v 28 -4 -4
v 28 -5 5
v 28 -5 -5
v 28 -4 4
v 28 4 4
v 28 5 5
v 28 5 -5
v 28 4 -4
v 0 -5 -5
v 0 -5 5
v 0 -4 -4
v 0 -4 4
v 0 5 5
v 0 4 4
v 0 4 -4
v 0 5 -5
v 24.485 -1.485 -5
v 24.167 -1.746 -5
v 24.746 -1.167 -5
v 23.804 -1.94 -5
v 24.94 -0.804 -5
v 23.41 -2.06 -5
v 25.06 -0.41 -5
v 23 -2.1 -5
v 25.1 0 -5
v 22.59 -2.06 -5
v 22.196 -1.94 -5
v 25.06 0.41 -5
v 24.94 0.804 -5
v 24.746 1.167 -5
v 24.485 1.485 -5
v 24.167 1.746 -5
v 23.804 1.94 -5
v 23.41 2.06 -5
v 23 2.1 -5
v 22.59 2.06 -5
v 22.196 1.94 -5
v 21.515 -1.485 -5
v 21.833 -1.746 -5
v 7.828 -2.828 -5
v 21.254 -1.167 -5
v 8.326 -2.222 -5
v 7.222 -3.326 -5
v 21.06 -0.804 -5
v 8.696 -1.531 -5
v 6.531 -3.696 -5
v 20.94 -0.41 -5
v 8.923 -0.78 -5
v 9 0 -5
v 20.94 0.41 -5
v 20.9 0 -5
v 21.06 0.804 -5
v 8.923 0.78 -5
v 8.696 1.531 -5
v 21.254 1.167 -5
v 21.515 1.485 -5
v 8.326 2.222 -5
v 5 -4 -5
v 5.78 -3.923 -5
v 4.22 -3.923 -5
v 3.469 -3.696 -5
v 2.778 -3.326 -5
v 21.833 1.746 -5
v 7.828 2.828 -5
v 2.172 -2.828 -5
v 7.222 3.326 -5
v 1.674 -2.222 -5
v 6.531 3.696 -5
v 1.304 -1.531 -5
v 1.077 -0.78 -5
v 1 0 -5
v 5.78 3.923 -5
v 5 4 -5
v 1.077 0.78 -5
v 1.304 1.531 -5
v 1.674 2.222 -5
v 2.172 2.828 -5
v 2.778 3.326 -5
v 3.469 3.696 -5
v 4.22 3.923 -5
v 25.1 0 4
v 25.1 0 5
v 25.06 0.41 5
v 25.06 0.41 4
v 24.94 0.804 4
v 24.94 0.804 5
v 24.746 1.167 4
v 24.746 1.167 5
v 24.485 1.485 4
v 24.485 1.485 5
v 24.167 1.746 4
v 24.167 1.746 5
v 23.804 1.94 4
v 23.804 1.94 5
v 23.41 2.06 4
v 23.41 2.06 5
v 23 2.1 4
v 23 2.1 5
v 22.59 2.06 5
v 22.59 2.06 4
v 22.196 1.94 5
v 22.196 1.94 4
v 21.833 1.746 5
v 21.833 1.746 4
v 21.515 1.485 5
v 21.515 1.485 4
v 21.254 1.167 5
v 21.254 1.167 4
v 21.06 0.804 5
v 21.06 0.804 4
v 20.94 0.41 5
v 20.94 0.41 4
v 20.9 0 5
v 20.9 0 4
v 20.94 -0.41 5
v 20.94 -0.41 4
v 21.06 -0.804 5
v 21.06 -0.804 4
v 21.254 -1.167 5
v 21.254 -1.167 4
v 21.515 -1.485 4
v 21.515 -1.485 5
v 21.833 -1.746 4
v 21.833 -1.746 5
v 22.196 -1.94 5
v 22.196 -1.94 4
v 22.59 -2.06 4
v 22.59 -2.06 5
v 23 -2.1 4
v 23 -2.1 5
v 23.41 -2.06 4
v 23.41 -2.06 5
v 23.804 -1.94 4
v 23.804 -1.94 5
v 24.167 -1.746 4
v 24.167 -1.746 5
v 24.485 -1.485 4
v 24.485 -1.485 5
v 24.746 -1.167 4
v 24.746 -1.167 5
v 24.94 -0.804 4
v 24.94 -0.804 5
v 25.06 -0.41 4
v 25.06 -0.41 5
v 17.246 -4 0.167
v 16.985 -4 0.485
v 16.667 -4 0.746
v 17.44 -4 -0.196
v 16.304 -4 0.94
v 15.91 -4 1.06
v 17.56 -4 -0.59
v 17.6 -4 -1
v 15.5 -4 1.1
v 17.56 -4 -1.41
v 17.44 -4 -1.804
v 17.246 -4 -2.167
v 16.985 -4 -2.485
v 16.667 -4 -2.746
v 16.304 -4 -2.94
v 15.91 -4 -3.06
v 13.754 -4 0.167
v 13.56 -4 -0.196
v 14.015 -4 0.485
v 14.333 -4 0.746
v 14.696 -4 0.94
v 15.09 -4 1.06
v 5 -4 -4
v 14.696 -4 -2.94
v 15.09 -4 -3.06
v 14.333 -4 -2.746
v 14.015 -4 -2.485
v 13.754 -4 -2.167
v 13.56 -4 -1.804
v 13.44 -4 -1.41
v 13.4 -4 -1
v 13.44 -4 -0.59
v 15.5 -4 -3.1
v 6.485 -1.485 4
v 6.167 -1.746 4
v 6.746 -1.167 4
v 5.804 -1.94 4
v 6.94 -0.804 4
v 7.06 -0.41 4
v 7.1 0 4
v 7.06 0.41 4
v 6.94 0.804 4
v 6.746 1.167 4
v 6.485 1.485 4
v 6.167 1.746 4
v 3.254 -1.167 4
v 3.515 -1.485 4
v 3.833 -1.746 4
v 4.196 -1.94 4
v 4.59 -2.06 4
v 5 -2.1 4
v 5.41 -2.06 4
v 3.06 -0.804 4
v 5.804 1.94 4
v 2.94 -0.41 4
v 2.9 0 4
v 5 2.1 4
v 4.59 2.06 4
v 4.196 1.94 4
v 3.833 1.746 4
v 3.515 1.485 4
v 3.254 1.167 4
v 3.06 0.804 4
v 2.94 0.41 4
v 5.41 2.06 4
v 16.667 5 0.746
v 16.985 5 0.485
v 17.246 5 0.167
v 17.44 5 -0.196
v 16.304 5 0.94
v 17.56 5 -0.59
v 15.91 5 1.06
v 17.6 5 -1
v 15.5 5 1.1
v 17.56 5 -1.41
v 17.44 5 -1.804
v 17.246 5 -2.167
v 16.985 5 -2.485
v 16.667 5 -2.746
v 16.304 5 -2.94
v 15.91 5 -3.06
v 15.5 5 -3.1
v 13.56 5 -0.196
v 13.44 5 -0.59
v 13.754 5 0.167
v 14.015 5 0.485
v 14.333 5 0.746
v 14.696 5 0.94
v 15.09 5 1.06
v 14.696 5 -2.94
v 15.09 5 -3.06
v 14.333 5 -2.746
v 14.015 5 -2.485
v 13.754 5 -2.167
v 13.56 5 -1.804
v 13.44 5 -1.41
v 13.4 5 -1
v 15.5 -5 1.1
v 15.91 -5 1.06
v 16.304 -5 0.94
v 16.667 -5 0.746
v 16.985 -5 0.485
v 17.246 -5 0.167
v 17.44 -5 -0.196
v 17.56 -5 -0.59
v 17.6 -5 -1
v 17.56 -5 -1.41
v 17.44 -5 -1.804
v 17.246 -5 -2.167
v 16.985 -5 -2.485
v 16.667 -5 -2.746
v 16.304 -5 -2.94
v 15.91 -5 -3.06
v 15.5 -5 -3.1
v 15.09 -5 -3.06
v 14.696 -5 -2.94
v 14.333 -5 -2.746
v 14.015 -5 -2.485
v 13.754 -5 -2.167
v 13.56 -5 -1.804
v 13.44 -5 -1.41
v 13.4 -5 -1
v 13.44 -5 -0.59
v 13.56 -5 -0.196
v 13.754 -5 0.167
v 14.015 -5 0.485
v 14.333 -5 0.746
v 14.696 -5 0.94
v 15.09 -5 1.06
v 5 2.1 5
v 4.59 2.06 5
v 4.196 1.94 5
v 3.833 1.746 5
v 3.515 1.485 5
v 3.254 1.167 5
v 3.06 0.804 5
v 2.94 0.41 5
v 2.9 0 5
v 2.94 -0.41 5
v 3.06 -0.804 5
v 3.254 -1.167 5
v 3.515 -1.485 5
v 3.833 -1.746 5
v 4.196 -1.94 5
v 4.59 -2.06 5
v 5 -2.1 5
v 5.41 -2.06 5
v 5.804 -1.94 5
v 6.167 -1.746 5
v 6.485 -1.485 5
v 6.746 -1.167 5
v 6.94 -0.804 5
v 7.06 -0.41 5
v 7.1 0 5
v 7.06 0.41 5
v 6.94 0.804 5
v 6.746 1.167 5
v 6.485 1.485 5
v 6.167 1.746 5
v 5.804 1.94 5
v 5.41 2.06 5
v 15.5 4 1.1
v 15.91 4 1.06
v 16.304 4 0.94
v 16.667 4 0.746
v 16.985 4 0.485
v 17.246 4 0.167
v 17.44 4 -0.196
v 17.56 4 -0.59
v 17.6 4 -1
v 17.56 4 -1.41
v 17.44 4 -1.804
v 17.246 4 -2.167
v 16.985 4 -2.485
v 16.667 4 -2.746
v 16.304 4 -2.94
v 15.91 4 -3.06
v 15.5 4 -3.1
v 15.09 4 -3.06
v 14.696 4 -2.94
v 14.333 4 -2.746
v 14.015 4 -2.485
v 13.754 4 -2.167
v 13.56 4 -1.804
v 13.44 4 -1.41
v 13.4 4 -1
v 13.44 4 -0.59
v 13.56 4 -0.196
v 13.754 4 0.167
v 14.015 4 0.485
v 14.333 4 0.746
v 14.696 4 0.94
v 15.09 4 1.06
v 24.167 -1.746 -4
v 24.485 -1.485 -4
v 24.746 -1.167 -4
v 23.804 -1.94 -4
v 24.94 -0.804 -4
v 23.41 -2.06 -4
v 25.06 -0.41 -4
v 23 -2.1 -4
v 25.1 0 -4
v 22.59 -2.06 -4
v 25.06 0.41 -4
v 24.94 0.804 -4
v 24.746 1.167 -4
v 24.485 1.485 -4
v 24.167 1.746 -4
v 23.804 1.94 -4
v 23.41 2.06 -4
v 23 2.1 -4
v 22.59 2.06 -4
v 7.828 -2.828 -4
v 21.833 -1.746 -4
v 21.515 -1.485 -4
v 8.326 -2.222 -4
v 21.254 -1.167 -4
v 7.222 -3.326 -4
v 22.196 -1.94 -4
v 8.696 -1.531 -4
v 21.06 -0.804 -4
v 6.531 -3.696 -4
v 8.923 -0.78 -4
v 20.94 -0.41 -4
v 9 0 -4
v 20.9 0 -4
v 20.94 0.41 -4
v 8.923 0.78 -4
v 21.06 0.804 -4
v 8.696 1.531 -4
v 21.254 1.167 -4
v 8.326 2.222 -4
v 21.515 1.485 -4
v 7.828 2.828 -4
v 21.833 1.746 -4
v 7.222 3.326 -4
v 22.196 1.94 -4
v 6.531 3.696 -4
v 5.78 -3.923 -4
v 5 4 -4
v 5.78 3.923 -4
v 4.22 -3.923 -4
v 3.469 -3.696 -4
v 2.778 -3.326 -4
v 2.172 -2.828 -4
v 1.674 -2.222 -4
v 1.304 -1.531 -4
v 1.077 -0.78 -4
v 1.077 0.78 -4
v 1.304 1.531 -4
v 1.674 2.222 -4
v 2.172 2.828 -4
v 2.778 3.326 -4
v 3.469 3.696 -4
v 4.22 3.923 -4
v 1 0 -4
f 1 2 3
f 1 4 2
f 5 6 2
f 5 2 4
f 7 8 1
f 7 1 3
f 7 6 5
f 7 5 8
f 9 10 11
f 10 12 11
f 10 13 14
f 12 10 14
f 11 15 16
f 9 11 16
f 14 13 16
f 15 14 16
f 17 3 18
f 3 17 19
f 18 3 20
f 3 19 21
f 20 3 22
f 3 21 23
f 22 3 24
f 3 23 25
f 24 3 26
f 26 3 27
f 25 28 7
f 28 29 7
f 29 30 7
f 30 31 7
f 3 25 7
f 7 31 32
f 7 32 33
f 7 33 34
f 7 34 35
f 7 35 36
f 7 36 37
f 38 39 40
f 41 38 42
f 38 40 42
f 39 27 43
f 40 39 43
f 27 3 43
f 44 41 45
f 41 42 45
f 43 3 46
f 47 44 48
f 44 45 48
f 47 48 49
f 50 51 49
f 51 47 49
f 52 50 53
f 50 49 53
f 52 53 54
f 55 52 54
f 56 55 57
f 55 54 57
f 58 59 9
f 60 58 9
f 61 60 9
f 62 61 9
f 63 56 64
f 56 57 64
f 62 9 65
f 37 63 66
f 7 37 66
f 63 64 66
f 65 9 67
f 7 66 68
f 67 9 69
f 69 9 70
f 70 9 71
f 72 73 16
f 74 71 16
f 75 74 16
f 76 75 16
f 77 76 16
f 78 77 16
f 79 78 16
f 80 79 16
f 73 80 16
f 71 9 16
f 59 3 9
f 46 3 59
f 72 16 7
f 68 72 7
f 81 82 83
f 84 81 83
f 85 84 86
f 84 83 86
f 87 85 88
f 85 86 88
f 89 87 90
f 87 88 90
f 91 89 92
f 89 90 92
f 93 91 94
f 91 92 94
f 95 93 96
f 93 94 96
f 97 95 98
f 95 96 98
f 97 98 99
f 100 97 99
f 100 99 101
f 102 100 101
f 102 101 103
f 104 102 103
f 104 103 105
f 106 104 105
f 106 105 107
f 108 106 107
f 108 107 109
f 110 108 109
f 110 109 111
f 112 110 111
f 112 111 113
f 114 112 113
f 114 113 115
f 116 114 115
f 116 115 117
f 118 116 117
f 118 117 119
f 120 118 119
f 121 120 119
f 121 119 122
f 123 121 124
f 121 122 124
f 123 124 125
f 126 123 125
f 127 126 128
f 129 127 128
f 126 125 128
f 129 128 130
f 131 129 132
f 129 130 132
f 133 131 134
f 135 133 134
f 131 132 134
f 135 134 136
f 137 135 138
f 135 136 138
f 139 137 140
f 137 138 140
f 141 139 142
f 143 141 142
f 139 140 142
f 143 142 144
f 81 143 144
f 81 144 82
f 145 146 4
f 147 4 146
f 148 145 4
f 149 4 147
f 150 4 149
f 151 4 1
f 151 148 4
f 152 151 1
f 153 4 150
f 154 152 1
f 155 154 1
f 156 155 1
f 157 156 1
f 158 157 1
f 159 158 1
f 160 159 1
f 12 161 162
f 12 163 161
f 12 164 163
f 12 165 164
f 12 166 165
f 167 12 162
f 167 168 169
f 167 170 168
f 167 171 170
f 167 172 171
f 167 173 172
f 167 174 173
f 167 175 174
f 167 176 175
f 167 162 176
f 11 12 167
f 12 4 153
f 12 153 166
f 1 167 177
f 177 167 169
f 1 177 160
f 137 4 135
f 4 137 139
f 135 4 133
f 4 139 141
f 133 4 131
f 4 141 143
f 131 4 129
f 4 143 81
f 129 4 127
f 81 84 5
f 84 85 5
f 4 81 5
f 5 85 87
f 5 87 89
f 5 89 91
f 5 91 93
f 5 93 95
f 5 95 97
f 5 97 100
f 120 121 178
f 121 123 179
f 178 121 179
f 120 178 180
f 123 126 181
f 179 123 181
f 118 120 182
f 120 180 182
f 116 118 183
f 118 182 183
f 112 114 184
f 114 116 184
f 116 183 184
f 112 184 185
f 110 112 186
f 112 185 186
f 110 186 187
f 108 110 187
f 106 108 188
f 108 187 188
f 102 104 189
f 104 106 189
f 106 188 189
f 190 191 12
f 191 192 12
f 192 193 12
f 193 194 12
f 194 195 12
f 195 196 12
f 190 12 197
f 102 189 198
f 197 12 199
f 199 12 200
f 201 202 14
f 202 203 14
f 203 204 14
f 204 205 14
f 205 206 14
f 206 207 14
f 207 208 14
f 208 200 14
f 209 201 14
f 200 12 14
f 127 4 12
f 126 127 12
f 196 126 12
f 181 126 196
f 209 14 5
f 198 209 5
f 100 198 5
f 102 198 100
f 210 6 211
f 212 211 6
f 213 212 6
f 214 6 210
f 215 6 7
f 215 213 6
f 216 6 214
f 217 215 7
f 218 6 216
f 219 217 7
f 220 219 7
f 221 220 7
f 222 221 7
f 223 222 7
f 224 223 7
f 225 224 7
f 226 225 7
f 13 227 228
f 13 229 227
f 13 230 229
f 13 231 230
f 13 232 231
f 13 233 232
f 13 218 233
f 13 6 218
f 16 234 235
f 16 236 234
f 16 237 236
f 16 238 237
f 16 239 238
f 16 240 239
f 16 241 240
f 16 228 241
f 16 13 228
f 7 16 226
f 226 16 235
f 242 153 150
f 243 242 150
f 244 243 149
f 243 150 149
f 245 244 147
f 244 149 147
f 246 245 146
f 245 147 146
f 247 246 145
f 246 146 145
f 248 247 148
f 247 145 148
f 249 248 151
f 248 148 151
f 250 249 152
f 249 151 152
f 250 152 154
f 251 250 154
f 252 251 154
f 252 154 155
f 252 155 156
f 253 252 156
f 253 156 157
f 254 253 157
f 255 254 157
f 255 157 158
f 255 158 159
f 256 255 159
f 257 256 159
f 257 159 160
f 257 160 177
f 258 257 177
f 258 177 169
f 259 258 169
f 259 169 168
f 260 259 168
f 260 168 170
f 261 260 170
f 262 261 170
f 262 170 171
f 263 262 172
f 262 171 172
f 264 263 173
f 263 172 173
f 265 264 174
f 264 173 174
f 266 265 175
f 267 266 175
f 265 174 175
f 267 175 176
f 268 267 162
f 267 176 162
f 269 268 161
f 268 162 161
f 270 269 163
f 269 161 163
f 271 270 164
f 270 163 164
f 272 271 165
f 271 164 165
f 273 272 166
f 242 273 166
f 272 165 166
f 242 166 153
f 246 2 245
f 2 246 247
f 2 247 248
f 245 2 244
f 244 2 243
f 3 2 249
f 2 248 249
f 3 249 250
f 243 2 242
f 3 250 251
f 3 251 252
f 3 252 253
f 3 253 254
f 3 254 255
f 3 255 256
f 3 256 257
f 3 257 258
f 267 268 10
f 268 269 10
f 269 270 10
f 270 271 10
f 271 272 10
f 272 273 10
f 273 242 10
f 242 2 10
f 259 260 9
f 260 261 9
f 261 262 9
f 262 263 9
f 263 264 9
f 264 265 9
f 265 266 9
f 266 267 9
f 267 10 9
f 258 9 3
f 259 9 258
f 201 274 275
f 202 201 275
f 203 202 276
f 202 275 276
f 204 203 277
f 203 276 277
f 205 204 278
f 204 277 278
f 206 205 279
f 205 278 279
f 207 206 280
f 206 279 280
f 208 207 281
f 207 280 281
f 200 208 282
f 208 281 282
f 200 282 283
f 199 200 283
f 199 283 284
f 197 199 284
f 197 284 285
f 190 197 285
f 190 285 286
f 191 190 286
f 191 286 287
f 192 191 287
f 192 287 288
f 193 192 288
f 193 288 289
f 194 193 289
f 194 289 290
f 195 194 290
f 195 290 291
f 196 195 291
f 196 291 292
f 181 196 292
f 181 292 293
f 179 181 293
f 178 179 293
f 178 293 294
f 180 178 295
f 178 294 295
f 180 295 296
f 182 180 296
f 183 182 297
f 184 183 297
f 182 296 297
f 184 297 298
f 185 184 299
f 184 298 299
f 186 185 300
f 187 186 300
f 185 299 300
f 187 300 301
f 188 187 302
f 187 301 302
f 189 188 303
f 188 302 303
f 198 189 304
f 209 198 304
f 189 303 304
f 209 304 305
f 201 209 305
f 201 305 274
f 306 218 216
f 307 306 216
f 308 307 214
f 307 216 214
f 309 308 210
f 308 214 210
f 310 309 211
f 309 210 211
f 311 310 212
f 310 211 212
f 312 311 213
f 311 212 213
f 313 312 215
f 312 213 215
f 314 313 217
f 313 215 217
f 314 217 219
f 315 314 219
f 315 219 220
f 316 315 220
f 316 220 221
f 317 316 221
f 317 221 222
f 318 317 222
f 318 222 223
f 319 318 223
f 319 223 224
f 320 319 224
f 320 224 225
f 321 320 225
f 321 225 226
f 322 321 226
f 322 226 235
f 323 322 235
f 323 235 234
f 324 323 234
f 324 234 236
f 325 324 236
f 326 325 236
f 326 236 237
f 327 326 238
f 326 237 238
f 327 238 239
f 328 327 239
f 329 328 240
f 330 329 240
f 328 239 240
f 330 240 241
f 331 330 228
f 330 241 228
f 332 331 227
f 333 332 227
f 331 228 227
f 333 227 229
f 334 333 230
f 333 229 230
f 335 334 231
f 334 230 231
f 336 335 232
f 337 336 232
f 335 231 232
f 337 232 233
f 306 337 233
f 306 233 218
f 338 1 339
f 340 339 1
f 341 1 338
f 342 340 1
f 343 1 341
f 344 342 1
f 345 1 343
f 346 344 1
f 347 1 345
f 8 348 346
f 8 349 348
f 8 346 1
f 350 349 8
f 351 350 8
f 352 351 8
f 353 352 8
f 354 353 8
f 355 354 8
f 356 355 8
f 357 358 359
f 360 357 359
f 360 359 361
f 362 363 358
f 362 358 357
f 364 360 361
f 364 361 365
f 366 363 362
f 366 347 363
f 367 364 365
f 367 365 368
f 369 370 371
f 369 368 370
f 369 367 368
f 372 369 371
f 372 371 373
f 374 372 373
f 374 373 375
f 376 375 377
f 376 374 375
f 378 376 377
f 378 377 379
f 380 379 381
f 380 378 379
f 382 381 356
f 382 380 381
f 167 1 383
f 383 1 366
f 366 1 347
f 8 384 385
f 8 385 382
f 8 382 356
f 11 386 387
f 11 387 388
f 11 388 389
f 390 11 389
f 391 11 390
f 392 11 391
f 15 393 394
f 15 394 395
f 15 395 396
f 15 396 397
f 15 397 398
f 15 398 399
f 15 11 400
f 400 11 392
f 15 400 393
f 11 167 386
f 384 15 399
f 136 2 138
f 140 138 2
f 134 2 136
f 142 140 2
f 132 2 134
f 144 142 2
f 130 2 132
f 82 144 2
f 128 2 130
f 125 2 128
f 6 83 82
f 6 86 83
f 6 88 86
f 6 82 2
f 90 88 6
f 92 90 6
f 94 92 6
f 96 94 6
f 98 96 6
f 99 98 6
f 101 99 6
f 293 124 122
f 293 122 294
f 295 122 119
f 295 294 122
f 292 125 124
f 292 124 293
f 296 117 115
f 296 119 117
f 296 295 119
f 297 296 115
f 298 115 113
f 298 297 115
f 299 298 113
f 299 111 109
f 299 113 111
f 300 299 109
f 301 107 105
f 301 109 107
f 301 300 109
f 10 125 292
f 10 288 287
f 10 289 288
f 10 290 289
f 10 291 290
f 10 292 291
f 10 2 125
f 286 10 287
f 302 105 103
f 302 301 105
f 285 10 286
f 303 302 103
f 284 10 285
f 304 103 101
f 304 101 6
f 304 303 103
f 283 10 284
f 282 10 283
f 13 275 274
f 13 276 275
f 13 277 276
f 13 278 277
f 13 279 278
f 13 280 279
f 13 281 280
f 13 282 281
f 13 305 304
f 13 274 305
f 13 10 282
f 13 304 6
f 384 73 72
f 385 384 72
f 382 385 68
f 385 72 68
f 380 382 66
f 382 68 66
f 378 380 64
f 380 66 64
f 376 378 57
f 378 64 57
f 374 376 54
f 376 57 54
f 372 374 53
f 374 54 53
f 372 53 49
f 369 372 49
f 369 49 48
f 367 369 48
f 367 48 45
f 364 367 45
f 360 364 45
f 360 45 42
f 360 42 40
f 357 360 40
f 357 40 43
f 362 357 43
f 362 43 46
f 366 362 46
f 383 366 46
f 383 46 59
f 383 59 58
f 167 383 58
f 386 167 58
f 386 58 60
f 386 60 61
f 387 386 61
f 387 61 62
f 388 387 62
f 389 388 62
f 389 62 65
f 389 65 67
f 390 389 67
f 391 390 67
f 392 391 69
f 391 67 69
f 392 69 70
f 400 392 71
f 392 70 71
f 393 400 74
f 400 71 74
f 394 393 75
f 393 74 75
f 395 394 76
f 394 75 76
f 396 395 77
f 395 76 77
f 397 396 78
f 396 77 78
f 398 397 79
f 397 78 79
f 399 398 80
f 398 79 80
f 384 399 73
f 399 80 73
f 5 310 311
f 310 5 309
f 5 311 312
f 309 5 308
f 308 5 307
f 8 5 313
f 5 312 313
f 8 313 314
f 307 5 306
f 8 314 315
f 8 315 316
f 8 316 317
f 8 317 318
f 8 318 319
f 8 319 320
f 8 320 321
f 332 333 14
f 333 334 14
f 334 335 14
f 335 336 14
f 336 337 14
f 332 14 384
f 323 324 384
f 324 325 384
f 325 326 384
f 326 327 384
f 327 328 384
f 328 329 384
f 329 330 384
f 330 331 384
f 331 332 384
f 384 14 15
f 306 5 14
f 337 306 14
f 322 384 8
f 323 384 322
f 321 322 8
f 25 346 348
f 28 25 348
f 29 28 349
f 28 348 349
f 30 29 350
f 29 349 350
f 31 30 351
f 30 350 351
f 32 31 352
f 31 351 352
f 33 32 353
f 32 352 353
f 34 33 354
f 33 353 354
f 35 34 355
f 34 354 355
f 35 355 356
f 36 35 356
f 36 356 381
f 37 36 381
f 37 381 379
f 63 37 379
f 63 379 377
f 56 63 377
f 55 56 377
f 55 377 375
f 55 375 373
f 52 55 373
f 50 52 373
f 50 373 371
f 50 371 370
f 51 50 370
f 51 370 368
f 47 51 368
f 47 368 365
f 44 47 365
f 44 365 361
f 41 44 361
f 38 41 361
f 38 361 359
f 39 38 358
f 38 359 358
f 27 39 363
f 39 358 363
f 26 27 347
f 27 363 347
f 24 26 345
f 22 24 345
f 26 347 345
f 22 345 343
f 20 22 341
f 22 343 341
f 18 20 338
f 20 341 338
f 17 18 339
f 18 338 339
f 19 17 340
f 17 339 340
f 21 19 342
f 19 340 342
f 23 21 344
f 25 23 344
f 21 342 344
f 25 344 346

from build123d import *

# Parameters (mm, degrees)
SKETCH_1_W          = 10
SKETCH_1_H          = 10
SKETCH_1_W_2        = 8
SKETCH_1_H_2        = 8
EXTRUDE_1_DEPTH     = 28
SKETCH_4_R          = 2.1
CUT_EXTRUDE_3_DEPTH = 31.149626863
SKETCH_5_R          = 2.1
CUT_EXTRUDE_4_DEPTH = 31.149626863
SKETCH_6_R          = 4
CUT_EXTRUDE_5_DEPTH = 1


with BuildPart() as part:
    # ｽｹｯﾁ1 → 押し出し-薄板1 (new body)
    with BuildSketch(Plane(origin=(0, 0, 0), x_dir=(0, 0, -1), z_dir=(1, 0, 0))):
        Rectangle(SKETCH_1_W, SKETCH_1_H)
        Rectangle(SKETCH_1_W_2, SKETCH_1_H_2, mode=Mode.SUBTRACT)
    extrude(amount=EXTRUDE_1_DEPTH)

    # ｽｹｯﾁ4 → ｶｯﾄ - 押し出し3 (cut, through all)
    with BuildSketch(Plane.XY.offset(5)):
        with Locations((23, 0)):
            Circle(SKETCH_4_R)
        with Locations(Location((5, 0, 0), (0, 0, 90))):
            Circle(SKETCH_4_R)
    extrude(amount=-CUT_EXTRUDE_3_DEPTH, mode=Mode.SUBTRACT)

    # ｽｹｯﾁ5 → ｶｯﾄ - 押し出し4 (cut, through all)
    with BuildSketch(Plane(origin=(0, 5, 0), x_dir=(1, 0, 0), z_dir=(0, 1, 0))):
        with Locations(Location((15.5, 1, 0), (0, 0, 270))):
            Circle(SKETCH_5_R)
    extrude(amount=-CUT_EXTRUDE_4_DEPTH, mode=Mode.SUBTRACT)

    # ｽｹｯﾁ6 → ｶｯﾄ - 押し出し5 (cut)
    with BuildSketch(Plane(origin=(0, 0, -5), x_dir=(-1, 0, 0), z_dir=(0, 0, -1))):
        with Locations(Location((-5, 0, 0), (0, 0, 90))):
            Circle(SKETCH_6_R)
    extrude(amount=-CUT_EXTRUDE_5_DEPTH, mode=Mode.SUBTRACT)


solid = part.part
